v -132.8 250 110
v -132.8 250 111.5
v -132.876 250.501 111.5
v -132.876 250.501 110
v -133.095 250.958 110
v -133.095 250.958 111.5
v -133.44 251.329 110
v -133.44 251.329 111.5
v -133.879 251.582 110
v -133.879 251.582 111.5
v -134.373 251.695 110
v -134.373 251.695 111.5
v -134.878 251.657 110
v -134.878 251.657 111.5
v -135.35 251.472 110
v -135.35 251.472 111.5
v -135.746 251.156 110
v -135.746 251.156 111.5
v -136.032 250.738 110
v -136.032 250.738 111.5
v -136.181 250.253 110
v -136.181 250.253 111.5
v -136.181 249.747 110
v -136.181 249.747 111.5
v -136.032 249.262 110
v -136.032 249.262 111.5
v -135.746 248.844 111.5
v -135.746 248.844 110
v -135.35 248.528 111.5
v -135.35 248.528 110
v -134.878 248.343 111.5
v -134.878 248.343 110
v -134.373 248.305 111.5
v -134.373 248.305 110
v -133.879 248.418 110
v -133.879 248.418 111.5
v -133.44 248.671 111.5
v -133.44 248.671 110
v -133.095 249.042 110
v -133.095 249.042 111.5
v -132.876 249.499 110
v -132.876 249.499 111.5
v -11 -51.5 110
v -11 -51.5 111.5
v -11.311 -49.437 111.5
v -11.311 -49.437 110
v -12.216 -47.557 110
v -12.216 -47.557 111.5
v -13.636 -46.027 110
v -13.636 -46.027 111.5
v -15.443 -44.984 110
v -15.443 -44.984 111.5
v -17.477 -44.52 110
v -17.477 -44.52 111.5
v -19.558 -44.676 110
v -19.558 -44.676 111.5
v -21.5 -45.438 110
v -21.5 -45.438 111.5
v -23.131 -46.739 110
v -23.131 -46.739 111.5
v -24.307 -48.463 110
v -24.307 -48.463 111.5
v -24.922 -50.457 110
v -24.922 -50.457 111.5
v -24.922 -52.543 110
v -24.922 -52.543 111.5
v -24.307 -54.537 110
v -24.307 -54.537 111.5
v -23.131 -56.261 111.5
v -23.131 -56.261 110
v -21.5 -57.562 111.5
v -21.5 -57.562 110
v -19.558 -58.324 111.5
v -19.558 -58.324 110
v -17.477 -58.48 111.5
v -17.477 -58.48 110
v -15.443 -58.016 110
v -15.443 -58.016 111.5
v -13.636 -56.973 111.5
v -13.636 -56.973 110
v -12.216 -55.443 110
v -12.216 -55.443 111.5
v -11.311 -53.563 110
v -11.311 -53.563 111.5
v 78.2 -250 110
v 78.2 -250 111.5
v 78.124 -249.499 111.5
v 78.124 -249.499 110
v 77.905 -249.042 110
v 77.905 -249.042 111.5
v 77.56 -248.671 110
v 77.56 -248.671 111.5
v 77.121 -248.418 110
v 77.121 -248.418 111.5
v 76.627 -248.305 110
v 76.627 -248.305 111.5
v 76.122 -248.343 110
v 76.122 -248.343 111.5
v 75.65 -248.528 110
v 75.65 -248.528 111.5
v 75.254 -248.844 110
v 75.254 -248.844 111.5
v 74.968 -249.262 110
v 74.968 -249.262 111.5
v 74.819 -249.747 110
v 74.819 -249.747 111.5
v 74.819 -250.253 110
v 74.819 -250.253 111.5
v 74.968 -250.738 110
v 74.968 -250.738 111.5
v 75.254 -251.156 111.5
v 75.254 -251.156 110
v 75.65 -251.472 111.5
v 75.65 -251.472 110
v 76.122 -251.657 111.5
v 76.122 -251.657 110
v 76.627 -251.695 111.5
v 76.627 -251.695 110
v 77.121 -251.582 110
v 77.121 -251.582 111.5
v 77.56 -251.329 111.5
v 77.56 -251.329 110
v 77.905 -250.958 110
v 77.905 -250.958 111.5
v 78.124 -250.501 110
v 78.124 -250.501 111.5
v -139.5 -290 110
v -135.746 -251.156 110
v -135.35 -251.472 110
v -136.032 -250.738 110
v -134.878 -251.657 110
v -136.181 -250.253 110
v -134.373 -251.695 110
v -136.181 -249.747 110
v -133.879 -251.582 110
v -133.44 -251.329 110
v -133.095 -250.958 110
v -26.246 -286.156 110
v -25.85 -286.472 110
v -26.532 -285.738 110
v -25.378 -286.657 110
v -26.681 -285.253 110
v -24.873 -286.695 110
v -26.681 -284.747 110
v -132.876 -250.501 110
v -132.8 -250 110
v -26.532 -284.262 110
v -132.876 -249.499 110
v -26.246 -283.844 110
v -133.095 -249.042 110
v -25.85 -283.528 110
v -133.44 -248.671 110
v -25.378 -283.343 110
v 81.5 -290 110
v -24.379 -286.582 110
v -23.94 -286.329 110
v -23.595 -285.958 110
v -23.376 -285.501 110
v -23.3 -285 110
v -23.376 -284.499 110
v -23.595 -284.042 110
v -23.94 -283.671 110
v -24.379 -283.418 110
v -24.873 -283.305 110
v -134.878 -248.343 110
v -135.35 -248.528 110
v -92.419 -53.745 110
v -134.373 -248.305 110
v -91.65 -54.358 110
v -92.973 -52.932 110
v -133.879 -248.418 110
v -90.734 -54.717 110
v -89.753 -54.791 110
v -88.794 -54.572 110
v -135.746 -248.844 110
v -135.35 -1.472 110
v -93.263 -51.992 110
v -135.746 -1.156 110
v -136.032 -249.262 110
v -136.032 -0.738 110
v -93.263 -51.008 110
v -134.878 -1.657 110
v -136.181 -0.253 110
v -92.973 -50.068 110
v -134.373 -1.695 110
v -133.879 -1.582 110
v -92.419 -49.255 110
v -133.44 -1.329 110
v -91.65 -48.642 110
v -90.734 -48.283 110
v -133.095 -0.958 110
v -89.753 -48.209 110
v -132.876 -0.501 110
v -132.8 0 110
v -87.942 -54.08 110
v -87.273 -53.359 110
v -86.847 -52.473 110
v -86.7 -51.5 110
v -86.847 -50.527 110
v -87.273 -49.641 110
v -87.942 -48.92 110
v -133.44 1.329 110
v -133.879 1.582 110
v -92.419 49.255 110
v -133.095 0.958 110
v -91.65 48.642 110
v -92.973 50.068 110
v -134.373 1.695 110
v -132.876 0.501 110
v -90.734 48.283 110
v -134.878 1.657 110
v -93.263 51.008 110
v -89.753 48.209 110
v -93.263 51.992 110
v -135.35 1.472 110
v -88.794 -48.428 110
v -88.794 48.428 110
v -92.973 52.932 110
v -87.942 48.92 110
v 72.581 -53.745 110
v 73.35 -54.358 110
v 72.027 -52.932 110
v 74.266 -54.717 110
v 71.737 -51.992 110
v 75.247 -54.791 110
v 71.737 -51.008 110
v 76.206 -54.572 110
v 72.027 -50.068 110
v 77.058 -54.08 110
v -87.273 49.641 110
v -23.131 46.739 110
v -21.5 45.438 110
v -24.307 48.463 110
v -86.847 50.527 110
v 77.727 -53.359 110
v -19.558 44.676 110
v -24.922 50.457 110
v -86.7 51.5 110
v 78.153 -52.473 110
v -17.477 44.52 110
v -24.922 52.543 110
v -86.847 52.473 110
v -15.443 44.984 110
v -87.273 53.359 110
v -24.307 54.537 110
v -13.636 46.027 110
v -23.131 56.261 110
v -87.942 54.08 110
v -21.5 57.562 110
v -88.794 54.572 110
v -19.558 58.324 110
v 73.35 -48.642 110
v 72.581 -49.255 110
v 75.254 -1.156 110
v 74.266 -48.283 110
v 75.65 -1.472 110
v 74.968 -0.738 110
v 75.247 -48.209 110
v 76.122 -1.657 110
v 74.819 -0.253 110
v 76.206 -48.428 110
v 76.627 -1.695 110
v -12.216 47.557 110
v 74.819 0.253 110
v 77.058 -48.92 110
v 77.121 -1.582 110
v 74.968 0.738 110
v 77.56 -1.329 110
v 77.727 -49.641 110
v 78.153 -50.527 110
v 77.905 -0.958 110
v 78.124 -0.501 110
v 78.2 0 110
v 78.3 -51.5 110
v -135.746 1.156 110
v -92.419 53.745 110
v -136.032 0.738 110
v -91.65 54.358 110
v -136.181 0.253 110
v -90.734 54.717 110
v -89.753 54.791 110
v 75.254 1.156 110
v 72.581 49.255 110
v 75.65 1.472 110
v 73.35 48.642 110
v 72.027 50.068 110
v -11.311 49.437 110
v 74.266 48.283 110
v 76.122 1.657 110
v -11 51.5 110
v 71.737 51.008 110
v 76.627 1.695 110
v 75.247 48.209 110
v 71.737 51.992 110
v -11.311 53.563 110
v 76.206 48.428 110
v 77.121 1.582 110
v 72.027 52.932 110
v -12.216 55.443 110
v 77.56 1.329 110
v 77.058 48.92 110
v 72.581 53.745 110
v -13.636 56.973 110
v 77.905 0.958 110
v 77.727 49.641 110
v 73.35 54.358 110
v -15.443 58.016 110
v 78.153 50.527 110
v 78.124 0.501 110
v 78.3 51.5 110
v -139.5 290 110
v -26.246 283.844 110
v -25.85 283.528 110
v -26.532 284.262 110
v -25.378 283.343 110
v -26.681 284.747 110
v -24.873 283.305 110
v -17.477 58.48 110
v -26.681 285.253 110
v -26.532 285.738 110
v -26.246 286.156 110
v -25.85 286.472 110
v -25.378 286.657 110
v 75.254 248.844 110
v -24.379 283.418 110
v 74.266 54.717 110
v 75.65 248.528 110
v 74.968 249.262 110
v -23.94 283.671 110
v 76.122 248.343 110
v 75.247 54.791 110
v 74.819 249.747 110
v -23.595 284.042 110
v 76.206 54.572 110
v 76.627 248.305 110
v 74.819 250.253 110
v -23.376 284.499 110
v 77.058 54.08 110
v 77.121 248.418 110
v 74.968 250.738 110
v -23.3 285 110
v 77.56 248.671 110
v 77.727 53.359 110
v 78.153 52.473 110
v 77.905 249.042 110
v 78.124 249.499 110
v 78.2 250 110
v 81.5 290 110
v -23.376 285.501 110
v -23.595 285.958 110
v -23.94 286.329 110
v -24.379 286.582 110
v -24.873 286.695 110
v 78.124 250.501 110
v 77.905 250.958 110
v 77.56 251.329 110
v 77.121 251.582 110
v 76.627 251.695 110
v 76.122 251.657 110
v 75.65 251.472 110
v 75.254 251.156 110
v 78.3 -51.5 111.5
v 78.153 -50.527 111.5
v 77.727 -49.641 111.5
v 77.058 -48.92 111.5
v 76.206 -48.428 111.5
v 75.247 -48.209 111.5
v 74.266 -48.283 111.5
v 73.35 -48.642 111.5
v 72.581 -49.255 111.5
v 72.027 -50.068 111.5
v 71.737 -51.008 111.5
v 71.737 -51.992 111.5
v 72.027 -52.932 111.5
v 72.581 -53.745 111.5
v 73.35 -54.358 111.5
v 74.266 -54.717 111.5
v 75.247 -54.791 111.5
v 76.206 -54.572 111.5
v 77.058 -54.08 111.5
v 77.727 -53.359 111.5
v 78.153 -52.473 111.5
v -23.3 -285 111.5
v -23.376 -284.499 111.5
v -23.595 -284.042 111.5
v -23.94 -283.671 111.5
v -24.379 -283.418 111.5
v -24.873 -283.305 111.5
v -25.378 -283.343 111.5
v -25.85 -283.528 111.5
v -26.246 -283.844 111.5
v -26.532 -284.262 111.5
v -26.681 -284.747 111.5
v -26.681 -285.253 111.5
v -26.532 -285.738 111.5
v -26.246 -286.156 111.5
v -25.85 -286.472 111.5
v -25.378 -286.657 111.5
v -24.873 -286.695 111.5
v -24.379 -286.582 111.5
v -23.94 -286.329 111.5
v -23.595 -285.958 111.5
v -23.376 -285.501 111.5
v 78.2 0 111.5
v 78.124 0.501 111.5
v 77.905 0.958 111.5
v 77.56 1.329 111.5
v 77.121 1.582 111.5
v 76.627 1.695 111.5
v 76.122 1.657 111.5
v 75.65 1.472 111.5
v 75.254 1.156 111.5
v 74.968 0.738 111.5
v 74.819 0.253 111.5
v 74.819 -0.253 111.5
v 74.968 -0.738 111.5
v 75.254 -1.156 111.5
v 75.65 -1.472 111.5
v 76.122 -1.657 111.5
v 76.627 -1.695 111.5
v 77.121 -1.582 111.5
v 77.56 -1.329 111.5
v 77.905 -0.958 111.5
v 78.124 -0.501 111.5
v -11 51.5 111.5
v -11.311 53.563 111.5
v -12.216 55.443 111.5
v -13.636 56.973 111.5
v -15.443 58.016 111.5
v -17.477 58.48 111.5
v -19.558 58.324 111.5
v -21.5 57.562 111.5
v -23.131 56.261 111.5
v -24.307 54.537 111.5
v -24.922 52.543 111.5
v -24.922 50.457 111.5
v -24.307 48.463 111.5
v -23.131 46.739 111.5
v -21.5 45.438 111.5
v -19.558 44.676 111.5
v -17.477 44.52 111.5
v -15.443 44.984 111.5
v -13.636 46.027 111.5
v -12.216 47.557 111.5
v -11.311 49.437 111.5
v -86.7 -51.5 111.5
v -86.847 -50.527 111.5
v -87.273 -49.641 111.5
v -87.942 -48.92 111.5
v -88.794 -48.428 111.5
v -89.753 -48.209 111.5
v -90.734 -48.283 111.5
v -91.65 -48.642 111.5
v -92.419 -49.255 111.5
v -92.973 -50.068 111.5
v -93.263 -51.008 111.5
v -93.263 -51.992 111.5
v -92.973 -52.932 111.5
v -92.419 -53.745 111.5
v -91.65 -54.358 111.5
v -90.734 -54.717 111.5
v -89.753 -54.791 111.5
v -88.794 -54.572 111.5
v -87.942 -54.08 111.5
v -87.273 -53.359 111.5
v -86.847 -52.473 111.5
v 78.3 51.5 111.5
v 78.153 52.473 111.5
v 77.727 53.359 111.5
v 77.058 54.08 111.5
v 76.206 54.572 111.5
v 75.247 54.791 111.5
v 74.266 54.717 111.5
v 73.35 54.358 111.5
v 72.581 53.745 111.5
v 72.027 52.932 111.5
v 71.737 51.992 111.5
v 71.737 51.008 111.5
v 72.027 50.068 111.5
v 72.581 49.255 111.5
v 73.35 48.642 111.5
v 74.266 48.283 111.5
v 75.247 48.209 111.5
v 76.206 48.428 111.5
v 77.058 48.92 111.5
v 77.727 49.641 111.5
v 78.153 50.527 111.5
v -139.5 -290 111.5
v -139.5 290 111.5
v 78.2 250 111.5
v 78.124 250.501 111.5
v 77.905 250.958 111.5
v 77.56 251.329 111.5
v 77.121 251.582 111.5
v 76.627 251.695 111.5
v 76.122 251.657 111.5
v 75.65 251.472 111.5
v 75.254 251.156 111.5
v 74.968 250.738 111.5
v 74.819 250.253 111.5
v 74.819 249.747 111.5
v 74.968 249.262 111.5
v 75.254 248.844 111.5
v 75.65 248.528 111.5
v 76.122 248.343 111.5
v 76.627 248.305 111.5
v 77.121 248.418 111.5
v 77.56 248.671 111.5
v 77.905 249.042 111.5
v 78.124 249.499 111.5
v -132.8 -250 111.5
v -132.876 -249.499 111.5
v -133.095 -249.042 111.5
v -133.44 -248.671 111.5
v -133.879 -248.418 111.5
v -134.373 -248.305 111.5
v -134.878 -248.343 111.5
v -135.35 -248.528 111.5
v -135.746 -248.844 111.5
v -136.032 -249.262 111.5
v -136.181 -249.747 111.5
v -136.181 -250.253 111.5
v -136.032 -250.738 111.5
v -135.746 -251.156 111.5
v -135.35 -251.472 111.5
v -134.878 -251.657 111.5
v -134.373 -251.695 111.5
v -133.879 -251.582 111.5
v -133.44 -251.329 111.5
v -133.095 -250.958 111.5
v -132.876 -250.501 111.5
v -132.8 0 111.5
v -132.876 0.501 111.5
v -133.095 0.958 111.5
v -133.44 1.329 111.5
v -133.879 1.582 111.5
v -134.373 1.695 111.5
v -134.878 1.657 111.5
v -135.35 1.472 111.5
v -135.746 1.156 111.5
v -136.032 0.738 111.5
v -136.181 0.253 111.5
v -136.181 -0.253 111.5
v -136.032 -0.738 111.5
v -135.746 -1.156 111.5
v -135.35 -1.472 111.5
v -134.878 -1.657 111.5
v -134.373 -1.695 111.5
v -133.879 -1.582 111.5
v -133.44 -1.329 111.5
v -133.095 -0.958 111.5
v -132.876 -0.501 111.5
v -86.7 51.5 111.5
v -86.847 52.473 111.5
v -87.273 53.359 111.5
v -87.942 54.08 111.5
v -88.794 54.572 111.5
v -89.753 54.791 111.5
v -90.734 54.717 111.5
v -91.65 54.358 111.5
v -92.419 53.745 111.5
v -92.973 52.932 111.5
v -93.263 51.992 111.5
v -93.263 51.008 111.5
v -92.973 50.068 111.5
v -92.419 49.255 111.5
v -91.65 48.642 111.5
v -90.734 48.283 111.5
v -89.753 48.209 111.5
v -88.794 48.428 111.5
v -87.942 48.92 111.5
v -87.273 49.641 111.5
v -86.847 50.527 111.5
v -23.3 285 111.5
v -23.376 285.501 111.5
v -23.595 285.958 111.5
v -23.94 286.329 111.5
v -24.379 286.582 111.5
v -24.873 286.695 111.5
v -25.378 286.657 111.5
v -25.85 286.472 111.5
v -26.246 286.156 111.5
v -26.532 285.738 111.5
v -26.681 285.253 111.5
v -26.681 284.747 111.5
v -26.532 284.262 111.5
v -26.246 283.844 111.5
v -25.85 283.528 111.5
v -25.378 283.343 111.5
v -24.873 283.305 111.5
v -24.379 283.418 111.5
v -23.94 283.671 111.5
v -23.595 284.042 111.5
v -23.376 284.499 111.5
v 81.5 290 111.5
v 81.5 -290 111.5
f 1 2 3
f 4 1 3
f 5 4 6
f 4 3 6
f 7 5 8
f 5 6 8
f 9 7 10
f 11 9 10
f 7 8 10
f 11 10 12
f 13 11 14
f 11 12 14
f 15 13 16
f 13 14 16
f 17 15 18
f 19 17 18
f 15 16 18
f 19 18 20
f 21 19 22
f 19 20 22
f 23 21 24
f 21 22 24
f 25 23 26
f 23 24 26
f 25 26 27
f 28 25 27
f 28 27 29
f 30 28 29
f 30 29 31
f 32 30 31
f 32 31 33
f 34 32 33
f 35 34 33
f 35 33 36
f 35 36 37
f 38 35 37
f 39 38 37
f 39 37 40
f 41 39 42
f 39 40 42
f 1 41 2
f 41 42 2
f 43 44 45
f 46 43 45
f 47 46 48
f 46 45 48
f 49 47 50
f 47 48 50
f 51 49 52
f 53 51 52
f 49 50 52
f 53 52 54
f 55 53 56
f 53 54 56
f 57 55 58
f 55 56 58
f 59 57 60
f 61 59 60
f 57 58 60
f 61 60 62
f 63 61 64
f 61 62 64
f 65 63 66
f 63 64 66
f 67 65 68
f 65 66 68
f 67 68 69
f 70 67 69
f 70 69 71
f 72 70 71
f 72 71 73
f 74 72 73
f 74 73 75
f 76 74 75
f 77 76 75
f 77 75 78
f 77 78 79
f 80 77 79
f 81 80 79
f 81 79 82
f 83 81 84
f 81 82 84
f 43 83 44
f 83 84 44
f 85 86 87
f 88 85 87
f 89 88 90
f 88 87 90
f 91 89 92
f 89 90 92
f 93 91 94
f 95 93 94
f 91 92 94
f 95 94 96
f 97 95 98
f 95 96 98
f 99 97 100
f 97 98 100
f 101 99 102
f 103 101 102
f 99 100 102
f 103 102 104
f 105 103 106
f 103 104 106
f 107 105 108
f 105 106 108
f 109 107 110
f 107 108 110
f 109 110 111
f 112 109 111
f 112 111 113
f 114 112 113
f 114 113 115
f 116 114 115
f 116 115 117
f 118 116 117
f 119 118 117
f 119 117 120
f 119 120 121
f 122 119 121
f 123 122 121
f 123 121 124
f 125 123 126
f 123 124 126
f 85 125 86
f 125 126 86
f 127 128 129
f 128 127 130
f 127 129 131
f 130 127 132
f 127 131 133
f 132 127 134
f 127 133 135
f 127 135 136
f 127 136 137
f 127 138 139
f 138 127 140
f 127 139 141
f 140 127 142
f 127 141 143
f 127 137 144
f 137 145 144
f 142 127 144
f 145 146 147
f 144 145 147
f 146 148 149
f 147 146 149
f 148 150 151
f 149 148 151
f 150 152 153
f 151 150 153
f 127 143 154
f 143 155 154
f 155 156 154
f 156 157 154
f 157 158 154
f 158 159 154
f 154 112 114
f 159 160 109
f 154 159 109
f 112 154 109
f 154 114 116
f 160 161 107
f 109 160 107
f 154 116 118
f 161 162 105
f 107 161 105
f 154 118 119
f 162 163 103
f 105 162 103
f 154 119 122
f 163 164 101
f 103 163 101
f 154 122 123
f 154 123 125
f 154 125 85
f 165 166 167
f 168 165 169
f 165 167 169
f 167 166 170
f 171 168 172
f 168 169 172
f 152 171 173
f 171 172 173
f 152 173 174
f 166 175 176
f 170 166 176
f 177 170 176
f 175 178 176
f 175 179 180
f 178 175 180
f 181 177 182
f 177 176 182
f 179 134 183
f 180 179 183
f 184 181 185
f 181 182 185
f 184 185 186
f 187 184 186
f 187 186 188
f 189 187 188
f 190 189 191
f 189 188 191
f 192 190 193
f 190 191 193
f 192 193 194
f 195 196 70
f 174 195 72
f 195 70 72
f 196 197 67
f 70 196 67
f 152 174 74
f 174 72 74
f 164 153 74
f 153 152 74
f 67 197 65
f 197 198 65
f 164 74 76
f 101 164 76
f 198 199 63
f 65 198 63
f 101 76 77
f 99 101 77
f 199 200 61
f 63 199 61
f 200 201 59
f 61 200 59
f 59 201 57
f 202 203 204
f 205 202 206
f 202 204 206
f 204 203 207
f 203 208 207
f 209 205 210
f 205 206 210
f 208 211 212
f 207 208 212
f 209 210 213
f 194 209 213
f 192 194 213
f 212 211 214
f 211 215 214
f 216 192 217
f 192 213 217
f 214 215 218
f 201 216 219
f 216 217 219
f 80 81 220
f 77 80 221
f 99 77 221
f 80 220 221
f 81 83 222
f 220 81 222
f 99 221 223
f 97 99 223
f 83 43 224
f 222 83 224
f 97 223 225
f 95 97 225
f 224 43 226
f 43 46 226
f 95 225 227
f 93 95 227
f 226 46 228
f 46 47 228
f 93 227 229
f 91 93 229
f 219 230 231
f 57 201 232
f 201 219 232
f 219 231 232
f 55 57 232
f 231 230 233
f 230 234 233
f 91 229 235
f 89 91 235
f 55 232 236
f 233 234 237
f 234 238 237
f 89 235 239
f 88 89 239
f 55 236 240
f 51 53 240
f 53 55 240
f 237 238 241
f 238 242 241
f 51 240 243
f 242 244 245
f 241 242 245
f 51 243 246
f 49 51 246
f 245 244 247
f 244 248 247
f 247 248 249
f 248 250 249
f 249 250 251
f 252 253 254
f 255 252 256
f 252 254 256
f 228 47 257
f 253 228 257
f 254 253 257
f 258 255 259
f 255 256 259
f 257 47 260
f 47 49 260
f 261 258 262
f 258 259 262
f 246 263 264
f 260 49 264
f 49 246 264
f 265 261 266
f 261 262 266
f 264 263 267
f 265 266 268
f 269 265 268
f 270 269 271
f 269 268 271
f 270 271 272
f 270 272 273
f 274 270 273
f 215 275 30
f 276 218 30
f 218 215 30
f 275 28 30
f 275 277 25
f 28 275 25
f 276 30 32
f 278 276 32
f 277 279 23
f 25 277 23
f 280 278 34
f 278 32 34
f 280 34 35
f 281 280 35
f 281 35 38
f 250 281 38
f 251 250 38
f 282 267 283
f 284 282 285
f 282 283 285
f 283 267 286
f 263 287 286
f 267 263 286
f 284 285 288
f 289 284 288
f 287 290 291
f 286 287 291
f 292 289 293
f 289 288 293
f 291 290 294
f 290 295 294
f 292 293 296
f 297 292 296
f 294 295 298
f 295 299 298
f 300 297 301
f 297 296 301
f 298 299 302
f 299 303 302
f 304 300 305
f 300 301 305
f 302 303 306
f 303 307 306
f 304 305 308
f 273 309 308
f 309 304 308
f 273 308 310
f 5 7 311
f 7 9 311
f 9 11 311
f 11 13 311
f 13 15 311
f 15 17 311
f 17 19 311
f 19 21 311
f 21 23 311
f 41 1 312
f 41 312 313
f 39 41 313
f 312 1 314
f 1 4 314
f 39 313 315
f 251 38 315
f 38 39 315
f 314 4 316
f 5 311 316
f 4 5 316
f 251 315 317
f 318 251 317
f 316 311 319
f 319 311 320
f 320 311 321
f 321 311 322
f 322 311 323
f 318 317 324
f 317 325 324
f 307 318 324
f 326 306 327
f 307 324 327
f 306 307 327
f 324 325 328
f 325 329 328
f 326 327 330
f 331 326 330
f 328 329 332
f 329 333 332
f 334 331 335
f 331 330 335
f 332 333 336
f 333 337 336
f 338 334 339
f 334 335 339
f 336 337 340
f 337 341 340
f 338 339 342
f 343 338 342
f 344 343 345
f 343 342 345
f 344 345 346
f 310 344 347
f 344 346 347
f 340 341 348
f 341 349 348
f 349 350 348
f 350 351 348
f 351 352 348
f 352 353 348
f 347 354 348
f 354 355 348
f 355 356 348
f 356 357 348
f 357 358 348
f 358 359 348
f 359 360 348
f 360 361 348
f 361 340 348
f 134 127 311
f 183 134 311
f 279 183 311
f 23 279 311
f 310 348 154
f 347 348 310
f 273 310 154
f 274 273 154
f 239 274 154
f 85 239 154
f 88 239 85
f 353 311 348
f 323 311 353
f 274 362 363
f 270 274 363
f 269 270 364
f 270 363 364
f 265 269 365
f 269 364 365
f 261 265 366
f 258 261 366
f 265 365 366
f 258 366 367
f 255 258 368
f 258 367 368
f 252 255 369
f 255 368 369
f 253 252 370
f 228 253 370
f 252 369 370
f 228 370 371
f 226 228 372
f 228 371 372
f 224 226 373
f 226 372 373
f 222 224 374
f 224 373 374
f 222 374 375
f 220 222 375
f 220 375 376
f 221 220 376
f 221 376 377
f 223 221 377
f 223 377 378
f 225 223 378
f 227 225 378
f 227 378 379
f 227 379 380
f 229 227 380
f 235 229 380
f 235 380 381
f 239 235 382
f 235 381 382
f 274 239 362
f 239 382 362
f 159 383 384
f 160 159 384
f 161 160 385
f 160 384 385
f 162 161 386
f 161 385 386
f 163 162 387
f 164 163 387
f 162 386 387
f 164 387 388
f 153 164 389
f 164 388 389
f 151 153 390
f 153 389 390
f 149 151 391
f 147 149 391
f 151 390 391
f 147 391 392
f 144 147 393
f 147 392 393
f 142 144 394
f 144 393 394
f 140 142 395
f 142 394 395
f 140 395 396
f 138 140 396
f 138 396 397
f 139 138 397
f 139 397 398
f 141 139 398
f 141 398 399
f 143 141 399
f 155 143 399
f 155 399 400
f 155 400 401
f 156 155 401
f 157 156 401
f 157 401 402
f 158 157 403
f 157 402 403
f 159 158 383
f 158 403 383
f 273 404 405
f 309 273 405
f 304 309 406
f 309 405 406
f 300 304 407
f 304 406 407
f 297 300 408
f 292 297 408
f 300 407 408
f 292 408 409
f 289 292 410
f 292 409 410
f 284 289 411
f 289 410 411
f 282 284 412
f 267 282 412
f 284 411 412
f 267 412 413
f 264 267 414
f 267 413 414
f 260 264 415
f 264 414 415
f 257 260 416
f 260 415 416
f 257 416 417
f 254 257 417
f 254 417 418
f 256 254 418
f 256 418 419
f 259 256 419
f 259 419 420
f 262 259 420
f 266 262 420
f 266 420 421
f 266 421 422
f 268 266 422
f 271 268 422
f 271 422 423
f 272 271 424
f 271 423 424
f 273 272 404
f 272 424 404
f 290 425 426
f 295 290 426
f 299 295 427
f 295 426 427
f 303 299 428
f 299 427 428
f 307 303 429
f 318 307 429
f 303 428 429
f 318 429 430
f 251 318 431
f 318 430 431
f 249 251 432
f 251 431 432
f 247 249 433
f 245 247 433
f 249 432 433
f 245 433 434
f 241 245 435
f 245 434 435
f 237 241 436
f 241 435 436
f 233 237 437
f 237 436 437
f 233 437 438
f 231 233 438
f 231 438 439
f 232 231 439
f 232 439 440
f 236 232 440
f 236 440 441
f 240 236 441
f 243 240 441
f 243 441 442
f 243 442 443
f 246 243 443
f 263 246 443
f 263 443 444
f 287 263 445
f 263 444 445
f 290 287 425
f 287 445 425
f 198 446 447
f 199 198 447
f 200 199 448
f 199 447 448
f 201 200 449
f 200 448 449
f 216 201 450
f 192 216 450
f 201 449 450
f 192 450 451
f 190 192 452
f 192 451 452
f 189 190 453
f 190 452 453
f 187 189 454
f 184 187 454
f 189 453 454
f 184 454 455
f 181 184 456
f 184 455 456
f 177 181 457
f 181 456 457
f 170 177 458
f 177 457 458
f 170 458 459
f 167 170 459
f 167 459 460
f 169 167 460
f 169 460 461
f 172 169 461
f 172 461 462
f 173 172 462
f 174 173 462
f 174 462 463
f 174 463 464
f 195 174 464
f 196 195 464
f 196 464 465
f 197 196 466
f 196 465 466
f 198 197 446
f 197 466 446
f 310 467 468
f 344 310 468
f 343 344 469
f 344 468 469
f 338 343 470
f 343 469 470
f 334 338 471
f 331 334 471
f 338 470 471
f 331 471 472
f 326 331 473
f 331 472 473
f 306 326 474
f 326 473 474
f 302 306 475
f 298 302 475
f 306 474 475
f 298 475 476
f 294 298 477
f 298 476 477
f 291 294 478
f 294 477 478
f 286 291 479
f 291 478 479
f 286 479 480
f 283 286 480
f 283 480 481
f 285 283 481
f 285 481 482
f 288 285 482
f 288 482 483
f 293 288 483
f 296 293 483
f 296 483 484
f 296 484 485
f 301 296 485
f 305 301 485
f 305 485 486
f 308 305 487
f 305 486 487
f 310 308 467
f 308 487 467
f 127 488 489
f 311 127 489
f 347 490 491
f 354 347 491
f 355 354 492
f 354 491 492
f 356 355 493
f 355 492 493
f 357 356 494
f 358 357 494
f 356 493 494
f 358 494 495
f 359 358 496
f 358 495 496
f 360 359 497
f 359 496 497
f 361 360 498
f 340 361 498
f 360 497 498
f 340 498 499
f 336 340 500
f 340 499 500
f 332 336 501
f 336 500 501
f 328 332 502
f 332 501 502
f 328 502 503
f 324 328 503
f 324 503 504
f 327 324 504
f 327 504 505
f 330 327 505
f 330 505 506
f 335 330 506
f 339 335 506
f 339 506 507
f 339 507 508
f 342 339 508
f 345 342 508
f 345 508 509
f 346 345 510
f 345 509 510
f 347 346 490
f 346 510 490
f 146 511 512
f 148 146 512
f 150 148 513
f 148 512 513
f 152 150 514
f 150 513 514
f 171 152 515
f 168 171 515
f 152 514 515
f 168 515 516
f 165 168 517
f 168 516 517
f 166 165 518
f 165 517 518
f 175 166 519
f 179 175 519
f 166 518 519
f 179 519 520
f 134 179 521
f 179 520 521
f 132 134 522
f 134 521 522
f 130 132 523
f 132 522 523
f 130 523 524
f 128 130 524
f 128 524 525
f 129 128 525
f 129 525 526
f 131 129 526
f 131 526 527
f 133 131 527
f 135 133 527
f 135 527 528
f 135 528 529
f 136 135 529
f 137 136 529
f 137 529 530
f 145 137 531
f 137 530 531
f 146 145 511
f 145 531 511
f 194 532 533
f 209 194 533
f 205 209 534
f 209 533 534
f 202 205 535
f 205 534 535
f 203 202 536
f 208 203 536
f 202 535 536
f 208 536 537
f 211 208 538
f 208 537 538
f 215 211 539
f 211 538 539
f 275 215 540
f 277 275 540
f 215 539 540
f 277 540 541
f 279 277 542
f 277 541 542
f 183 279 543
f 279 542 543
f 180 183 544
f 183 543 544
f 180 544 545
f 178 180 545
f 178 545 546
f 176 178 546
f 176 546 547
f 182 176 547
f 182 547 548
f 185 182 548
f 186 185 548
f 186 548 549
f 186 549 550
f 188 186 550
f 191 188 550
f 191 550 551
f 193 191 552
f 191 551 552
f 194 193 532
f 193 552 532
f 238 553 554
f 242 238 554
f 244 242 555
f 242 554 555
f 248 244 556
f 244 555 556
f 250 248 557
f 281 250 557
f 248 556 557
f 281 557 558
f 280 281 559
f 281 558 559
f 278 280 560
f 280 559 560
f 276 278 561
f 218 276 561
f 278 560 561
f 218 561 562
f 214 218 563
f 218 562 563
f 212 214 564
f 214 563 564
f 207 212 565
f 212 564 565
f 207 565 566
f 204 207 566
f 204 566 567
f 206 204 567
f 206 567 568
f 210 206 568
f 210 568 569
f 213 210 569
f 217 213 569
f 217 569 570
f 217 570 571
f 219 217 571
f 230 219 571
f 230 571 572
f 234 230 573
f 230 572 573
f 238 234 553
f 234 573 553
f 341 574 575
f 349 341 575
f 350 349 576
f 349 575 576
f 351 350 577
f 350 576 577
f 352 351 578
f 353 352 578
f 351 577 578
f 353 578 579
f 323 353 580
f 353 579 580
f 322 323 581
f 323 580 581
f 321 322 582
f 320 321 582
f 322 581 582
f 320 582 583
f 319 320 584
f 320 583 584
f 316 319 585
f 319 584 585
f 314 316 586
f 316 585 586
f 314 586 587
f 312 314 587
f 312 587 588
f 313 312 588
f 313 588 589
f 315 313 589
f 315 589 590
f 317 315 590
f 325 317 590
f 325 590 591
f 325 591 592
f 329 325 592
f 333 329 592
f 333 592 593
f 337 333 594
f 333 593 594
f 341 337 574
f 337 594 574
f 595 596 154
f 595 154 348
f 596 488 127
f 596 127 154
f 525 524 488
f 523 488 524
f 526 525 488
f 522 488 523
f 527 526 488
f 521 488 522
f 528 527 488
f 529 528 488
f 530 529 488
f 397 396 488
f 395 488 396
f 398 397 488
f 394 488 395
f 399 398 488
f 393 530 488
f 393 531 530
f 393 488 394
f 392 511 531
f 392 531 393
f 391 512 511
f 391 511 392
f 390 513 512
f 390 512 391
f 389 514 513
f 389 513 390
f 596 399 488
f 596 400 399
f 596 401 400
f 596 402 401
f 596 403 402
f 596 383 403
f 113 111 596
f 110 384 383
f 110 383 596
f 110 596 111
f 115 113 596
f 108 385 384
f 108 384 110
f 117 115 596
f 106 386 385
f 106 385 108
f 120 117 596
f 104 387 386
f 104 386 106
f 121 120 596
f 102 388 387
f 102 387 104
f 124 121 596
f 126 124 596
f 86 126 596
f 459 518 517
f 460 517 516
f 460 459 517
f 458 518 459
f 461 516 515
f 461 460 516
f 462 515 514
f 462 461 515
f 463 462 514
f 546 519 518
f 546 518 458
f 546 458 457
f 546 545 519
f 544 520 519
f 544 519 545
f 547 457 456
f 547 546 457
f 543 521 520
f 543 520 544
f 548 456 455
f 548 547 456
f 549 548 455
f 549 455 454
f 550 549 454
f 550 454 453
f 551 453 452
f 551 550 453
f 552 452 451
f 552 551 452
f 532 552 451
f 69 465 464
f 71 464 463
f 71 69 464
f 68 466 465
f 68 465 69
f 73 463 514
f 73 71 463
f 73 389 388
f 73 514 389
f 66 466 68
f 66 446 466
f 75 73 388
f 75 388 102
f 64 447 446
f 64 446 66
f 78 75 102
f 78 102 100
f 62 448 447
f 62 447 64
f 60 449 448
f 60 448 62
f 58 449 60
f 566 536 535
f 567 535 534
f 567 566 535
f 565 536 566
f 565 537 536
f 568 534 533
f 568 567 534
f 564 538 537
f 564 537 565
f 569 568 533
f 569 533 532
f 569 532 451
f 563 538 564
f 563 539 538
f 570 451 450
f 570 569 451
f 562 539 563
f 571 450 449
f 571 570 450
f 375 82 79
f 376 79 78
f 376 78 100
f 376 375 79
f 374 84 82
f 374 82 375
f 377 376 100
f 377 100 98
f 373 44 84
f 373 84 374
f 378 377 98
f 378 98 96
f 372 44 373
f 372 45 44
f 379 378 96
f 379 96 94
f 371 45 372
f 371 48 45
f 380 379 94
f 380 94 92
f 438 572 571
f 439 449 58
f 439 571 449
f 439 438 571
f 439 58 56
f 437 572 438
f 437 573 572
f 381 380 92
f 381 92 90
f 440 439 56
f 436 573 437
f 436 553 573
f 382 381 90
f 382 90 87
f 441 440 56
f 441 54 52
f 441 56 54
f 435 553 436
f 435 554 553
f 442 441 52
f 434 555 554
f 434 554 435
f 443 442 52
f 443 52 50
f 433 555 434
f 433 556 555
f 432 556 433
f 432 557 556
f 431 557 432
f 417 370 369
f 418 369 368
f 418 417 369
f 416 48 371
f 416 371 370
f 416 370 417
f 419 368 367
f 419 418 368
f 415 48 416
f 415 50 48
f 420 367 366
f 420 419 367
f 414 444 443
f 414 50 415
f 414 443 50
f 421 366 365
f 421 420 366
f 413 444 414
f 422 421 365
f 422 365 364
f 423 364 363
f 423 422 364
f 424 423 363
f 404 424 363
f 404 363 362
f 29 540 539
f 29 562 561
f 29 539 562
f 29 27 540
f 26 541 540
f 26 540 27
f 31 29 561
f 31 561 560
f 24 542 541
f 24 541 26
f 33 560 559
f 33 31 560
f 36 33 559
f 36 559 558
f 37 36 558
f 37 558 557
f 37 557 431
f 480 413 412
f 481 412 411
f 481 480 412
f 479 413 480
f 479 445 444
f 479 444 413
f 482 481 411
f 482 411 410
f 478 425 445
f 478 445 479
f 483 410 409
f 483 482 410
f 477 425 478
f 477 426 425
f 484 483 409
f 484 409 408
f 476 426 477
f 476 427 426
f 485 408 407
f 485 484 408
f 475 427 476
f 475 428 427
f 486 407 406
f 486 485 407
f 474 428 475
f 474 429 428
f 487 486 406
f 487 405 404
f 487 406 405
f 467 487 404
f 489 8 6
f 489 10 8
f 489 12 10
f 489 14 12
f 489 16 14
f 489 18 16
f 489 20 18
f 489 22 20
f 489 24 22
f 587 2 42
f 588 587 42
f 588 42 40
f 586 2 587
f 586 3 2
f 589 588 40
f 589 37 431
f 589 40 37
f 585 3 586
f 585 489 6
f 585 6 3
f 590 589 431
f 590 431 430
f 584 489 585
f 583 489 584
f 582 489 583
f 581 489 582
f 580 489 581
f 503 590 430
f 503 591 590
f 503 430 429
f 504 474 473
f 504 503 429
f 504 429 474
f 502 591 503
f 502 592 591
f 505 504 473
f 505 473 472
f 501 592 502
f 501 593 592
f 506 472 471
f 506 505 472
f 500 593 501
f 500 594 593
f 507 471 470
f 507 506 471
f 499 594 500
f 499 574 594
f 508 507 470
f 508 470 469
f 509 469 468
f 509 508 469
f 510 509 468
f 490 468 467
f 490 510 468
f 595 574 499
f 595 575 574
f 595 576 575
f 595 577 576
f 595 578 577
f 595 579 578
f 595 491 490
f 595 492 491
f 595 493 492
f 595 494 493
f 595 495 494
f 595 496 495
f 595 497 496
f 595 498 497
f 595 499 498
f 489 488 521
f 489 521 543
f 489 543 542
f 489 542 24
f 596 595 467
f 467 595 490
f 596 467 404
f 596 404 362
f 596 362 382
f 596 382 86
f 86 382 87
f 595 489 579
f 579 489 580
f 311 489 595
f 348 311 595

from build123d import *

# Parameters (mm, degrees)
MAIN_PROFILE_SKETCH_W   = 221
MAIN_PROFILE_SKETCH_H   = 580
MAIN_PROFILE_SKETCH_R   = 1.7
MAIN_PROFILE_SKETCH_R_2 = 3.3
MAIN_PROFILE_SKETCH_R_3 = 7
MAIN_EXTRUSION_DEPTH    = 1.5


with BuildPart() as part:
    # Main Profile Sketch → Main Extrusion (new body)
    with BuildSketch(Plane.XY.offset(111.5)):
        with Locations((-29, 0)):
            Rectangle(MAIN_PROFILE_SKETCH_W, MAIN_PROFILE_SKETCH_H)
        with Locations((-134.5, -250)):
            Circle(MAIN_PROFILE_SKETCH_R, mode=Mode.SUBTRACT)
        with Locations((-90, -51.5)):
            Circle(MAIN_PROFILE_SKETCH_R_2, mode=Mode.SUBTRACT)
        with Locations((-25, -285)):
            Circle(MAIN_PROFILE_SKETCH_R, mode=Mode.SUBTRACT)
        with Locations((76.5, -250)):
            Circle(MAIN_PROFILE_SKETCH_R, mode=Mode.SUBTRACT)
        with Locations((-18, -51.5)):
            Circle(MAIN_PROFILE_SKETCH_R_3, mode=Mode.SUBTRACT)
        with Locations((75, -51.5)):
            Circle(MAIN_PROFILE_SKETCH_R_2, mode=Mode.SUBTRACT)
        with Locations((-134.5, 0)):
            Circle(MAIN_PROFILE_SKETCH_R, mode=Mode.SUBTRACT)
        with Locations((-90, 51.5)):
            Circle(MAIN_PROFILE_SKETCH_R_2, mode=Mode.SUBTRACT)
        with Locations((-134.5, 250)):
            Circle(MAIN_PROFILE_SKETCH_R, mode=Mode.SUBTRACT)
        with Locations((-18, 51.5)):
            Circle(MAIN_PROFILE_SKETCH_R_3, mode=Mode.SUBTRACT)
        with Locations((76.5, 0)):
            Circle(MAIN_PROFILE_SKETCH_R, mode=Mode.SUBTRACT)
        with Locations((75, 51.5)):
            Circle(MAIN_PROFILE_SKETCH_R_2, mode=Mode.SUBTRACT)
        with Locations((-25, 285)):
            Circle(MAIN_PROFILE_SKETCH_R, mode=Mode.SUBTRACT)
        with Locations((76.5, 250)):
            Circle(MAIN_PROFILE_SKETCH_R, mode=Mode.SUBTRACT)
    extrude(amount=-MAIN_EXTRUSION_DEPTH)


solid = part.part
